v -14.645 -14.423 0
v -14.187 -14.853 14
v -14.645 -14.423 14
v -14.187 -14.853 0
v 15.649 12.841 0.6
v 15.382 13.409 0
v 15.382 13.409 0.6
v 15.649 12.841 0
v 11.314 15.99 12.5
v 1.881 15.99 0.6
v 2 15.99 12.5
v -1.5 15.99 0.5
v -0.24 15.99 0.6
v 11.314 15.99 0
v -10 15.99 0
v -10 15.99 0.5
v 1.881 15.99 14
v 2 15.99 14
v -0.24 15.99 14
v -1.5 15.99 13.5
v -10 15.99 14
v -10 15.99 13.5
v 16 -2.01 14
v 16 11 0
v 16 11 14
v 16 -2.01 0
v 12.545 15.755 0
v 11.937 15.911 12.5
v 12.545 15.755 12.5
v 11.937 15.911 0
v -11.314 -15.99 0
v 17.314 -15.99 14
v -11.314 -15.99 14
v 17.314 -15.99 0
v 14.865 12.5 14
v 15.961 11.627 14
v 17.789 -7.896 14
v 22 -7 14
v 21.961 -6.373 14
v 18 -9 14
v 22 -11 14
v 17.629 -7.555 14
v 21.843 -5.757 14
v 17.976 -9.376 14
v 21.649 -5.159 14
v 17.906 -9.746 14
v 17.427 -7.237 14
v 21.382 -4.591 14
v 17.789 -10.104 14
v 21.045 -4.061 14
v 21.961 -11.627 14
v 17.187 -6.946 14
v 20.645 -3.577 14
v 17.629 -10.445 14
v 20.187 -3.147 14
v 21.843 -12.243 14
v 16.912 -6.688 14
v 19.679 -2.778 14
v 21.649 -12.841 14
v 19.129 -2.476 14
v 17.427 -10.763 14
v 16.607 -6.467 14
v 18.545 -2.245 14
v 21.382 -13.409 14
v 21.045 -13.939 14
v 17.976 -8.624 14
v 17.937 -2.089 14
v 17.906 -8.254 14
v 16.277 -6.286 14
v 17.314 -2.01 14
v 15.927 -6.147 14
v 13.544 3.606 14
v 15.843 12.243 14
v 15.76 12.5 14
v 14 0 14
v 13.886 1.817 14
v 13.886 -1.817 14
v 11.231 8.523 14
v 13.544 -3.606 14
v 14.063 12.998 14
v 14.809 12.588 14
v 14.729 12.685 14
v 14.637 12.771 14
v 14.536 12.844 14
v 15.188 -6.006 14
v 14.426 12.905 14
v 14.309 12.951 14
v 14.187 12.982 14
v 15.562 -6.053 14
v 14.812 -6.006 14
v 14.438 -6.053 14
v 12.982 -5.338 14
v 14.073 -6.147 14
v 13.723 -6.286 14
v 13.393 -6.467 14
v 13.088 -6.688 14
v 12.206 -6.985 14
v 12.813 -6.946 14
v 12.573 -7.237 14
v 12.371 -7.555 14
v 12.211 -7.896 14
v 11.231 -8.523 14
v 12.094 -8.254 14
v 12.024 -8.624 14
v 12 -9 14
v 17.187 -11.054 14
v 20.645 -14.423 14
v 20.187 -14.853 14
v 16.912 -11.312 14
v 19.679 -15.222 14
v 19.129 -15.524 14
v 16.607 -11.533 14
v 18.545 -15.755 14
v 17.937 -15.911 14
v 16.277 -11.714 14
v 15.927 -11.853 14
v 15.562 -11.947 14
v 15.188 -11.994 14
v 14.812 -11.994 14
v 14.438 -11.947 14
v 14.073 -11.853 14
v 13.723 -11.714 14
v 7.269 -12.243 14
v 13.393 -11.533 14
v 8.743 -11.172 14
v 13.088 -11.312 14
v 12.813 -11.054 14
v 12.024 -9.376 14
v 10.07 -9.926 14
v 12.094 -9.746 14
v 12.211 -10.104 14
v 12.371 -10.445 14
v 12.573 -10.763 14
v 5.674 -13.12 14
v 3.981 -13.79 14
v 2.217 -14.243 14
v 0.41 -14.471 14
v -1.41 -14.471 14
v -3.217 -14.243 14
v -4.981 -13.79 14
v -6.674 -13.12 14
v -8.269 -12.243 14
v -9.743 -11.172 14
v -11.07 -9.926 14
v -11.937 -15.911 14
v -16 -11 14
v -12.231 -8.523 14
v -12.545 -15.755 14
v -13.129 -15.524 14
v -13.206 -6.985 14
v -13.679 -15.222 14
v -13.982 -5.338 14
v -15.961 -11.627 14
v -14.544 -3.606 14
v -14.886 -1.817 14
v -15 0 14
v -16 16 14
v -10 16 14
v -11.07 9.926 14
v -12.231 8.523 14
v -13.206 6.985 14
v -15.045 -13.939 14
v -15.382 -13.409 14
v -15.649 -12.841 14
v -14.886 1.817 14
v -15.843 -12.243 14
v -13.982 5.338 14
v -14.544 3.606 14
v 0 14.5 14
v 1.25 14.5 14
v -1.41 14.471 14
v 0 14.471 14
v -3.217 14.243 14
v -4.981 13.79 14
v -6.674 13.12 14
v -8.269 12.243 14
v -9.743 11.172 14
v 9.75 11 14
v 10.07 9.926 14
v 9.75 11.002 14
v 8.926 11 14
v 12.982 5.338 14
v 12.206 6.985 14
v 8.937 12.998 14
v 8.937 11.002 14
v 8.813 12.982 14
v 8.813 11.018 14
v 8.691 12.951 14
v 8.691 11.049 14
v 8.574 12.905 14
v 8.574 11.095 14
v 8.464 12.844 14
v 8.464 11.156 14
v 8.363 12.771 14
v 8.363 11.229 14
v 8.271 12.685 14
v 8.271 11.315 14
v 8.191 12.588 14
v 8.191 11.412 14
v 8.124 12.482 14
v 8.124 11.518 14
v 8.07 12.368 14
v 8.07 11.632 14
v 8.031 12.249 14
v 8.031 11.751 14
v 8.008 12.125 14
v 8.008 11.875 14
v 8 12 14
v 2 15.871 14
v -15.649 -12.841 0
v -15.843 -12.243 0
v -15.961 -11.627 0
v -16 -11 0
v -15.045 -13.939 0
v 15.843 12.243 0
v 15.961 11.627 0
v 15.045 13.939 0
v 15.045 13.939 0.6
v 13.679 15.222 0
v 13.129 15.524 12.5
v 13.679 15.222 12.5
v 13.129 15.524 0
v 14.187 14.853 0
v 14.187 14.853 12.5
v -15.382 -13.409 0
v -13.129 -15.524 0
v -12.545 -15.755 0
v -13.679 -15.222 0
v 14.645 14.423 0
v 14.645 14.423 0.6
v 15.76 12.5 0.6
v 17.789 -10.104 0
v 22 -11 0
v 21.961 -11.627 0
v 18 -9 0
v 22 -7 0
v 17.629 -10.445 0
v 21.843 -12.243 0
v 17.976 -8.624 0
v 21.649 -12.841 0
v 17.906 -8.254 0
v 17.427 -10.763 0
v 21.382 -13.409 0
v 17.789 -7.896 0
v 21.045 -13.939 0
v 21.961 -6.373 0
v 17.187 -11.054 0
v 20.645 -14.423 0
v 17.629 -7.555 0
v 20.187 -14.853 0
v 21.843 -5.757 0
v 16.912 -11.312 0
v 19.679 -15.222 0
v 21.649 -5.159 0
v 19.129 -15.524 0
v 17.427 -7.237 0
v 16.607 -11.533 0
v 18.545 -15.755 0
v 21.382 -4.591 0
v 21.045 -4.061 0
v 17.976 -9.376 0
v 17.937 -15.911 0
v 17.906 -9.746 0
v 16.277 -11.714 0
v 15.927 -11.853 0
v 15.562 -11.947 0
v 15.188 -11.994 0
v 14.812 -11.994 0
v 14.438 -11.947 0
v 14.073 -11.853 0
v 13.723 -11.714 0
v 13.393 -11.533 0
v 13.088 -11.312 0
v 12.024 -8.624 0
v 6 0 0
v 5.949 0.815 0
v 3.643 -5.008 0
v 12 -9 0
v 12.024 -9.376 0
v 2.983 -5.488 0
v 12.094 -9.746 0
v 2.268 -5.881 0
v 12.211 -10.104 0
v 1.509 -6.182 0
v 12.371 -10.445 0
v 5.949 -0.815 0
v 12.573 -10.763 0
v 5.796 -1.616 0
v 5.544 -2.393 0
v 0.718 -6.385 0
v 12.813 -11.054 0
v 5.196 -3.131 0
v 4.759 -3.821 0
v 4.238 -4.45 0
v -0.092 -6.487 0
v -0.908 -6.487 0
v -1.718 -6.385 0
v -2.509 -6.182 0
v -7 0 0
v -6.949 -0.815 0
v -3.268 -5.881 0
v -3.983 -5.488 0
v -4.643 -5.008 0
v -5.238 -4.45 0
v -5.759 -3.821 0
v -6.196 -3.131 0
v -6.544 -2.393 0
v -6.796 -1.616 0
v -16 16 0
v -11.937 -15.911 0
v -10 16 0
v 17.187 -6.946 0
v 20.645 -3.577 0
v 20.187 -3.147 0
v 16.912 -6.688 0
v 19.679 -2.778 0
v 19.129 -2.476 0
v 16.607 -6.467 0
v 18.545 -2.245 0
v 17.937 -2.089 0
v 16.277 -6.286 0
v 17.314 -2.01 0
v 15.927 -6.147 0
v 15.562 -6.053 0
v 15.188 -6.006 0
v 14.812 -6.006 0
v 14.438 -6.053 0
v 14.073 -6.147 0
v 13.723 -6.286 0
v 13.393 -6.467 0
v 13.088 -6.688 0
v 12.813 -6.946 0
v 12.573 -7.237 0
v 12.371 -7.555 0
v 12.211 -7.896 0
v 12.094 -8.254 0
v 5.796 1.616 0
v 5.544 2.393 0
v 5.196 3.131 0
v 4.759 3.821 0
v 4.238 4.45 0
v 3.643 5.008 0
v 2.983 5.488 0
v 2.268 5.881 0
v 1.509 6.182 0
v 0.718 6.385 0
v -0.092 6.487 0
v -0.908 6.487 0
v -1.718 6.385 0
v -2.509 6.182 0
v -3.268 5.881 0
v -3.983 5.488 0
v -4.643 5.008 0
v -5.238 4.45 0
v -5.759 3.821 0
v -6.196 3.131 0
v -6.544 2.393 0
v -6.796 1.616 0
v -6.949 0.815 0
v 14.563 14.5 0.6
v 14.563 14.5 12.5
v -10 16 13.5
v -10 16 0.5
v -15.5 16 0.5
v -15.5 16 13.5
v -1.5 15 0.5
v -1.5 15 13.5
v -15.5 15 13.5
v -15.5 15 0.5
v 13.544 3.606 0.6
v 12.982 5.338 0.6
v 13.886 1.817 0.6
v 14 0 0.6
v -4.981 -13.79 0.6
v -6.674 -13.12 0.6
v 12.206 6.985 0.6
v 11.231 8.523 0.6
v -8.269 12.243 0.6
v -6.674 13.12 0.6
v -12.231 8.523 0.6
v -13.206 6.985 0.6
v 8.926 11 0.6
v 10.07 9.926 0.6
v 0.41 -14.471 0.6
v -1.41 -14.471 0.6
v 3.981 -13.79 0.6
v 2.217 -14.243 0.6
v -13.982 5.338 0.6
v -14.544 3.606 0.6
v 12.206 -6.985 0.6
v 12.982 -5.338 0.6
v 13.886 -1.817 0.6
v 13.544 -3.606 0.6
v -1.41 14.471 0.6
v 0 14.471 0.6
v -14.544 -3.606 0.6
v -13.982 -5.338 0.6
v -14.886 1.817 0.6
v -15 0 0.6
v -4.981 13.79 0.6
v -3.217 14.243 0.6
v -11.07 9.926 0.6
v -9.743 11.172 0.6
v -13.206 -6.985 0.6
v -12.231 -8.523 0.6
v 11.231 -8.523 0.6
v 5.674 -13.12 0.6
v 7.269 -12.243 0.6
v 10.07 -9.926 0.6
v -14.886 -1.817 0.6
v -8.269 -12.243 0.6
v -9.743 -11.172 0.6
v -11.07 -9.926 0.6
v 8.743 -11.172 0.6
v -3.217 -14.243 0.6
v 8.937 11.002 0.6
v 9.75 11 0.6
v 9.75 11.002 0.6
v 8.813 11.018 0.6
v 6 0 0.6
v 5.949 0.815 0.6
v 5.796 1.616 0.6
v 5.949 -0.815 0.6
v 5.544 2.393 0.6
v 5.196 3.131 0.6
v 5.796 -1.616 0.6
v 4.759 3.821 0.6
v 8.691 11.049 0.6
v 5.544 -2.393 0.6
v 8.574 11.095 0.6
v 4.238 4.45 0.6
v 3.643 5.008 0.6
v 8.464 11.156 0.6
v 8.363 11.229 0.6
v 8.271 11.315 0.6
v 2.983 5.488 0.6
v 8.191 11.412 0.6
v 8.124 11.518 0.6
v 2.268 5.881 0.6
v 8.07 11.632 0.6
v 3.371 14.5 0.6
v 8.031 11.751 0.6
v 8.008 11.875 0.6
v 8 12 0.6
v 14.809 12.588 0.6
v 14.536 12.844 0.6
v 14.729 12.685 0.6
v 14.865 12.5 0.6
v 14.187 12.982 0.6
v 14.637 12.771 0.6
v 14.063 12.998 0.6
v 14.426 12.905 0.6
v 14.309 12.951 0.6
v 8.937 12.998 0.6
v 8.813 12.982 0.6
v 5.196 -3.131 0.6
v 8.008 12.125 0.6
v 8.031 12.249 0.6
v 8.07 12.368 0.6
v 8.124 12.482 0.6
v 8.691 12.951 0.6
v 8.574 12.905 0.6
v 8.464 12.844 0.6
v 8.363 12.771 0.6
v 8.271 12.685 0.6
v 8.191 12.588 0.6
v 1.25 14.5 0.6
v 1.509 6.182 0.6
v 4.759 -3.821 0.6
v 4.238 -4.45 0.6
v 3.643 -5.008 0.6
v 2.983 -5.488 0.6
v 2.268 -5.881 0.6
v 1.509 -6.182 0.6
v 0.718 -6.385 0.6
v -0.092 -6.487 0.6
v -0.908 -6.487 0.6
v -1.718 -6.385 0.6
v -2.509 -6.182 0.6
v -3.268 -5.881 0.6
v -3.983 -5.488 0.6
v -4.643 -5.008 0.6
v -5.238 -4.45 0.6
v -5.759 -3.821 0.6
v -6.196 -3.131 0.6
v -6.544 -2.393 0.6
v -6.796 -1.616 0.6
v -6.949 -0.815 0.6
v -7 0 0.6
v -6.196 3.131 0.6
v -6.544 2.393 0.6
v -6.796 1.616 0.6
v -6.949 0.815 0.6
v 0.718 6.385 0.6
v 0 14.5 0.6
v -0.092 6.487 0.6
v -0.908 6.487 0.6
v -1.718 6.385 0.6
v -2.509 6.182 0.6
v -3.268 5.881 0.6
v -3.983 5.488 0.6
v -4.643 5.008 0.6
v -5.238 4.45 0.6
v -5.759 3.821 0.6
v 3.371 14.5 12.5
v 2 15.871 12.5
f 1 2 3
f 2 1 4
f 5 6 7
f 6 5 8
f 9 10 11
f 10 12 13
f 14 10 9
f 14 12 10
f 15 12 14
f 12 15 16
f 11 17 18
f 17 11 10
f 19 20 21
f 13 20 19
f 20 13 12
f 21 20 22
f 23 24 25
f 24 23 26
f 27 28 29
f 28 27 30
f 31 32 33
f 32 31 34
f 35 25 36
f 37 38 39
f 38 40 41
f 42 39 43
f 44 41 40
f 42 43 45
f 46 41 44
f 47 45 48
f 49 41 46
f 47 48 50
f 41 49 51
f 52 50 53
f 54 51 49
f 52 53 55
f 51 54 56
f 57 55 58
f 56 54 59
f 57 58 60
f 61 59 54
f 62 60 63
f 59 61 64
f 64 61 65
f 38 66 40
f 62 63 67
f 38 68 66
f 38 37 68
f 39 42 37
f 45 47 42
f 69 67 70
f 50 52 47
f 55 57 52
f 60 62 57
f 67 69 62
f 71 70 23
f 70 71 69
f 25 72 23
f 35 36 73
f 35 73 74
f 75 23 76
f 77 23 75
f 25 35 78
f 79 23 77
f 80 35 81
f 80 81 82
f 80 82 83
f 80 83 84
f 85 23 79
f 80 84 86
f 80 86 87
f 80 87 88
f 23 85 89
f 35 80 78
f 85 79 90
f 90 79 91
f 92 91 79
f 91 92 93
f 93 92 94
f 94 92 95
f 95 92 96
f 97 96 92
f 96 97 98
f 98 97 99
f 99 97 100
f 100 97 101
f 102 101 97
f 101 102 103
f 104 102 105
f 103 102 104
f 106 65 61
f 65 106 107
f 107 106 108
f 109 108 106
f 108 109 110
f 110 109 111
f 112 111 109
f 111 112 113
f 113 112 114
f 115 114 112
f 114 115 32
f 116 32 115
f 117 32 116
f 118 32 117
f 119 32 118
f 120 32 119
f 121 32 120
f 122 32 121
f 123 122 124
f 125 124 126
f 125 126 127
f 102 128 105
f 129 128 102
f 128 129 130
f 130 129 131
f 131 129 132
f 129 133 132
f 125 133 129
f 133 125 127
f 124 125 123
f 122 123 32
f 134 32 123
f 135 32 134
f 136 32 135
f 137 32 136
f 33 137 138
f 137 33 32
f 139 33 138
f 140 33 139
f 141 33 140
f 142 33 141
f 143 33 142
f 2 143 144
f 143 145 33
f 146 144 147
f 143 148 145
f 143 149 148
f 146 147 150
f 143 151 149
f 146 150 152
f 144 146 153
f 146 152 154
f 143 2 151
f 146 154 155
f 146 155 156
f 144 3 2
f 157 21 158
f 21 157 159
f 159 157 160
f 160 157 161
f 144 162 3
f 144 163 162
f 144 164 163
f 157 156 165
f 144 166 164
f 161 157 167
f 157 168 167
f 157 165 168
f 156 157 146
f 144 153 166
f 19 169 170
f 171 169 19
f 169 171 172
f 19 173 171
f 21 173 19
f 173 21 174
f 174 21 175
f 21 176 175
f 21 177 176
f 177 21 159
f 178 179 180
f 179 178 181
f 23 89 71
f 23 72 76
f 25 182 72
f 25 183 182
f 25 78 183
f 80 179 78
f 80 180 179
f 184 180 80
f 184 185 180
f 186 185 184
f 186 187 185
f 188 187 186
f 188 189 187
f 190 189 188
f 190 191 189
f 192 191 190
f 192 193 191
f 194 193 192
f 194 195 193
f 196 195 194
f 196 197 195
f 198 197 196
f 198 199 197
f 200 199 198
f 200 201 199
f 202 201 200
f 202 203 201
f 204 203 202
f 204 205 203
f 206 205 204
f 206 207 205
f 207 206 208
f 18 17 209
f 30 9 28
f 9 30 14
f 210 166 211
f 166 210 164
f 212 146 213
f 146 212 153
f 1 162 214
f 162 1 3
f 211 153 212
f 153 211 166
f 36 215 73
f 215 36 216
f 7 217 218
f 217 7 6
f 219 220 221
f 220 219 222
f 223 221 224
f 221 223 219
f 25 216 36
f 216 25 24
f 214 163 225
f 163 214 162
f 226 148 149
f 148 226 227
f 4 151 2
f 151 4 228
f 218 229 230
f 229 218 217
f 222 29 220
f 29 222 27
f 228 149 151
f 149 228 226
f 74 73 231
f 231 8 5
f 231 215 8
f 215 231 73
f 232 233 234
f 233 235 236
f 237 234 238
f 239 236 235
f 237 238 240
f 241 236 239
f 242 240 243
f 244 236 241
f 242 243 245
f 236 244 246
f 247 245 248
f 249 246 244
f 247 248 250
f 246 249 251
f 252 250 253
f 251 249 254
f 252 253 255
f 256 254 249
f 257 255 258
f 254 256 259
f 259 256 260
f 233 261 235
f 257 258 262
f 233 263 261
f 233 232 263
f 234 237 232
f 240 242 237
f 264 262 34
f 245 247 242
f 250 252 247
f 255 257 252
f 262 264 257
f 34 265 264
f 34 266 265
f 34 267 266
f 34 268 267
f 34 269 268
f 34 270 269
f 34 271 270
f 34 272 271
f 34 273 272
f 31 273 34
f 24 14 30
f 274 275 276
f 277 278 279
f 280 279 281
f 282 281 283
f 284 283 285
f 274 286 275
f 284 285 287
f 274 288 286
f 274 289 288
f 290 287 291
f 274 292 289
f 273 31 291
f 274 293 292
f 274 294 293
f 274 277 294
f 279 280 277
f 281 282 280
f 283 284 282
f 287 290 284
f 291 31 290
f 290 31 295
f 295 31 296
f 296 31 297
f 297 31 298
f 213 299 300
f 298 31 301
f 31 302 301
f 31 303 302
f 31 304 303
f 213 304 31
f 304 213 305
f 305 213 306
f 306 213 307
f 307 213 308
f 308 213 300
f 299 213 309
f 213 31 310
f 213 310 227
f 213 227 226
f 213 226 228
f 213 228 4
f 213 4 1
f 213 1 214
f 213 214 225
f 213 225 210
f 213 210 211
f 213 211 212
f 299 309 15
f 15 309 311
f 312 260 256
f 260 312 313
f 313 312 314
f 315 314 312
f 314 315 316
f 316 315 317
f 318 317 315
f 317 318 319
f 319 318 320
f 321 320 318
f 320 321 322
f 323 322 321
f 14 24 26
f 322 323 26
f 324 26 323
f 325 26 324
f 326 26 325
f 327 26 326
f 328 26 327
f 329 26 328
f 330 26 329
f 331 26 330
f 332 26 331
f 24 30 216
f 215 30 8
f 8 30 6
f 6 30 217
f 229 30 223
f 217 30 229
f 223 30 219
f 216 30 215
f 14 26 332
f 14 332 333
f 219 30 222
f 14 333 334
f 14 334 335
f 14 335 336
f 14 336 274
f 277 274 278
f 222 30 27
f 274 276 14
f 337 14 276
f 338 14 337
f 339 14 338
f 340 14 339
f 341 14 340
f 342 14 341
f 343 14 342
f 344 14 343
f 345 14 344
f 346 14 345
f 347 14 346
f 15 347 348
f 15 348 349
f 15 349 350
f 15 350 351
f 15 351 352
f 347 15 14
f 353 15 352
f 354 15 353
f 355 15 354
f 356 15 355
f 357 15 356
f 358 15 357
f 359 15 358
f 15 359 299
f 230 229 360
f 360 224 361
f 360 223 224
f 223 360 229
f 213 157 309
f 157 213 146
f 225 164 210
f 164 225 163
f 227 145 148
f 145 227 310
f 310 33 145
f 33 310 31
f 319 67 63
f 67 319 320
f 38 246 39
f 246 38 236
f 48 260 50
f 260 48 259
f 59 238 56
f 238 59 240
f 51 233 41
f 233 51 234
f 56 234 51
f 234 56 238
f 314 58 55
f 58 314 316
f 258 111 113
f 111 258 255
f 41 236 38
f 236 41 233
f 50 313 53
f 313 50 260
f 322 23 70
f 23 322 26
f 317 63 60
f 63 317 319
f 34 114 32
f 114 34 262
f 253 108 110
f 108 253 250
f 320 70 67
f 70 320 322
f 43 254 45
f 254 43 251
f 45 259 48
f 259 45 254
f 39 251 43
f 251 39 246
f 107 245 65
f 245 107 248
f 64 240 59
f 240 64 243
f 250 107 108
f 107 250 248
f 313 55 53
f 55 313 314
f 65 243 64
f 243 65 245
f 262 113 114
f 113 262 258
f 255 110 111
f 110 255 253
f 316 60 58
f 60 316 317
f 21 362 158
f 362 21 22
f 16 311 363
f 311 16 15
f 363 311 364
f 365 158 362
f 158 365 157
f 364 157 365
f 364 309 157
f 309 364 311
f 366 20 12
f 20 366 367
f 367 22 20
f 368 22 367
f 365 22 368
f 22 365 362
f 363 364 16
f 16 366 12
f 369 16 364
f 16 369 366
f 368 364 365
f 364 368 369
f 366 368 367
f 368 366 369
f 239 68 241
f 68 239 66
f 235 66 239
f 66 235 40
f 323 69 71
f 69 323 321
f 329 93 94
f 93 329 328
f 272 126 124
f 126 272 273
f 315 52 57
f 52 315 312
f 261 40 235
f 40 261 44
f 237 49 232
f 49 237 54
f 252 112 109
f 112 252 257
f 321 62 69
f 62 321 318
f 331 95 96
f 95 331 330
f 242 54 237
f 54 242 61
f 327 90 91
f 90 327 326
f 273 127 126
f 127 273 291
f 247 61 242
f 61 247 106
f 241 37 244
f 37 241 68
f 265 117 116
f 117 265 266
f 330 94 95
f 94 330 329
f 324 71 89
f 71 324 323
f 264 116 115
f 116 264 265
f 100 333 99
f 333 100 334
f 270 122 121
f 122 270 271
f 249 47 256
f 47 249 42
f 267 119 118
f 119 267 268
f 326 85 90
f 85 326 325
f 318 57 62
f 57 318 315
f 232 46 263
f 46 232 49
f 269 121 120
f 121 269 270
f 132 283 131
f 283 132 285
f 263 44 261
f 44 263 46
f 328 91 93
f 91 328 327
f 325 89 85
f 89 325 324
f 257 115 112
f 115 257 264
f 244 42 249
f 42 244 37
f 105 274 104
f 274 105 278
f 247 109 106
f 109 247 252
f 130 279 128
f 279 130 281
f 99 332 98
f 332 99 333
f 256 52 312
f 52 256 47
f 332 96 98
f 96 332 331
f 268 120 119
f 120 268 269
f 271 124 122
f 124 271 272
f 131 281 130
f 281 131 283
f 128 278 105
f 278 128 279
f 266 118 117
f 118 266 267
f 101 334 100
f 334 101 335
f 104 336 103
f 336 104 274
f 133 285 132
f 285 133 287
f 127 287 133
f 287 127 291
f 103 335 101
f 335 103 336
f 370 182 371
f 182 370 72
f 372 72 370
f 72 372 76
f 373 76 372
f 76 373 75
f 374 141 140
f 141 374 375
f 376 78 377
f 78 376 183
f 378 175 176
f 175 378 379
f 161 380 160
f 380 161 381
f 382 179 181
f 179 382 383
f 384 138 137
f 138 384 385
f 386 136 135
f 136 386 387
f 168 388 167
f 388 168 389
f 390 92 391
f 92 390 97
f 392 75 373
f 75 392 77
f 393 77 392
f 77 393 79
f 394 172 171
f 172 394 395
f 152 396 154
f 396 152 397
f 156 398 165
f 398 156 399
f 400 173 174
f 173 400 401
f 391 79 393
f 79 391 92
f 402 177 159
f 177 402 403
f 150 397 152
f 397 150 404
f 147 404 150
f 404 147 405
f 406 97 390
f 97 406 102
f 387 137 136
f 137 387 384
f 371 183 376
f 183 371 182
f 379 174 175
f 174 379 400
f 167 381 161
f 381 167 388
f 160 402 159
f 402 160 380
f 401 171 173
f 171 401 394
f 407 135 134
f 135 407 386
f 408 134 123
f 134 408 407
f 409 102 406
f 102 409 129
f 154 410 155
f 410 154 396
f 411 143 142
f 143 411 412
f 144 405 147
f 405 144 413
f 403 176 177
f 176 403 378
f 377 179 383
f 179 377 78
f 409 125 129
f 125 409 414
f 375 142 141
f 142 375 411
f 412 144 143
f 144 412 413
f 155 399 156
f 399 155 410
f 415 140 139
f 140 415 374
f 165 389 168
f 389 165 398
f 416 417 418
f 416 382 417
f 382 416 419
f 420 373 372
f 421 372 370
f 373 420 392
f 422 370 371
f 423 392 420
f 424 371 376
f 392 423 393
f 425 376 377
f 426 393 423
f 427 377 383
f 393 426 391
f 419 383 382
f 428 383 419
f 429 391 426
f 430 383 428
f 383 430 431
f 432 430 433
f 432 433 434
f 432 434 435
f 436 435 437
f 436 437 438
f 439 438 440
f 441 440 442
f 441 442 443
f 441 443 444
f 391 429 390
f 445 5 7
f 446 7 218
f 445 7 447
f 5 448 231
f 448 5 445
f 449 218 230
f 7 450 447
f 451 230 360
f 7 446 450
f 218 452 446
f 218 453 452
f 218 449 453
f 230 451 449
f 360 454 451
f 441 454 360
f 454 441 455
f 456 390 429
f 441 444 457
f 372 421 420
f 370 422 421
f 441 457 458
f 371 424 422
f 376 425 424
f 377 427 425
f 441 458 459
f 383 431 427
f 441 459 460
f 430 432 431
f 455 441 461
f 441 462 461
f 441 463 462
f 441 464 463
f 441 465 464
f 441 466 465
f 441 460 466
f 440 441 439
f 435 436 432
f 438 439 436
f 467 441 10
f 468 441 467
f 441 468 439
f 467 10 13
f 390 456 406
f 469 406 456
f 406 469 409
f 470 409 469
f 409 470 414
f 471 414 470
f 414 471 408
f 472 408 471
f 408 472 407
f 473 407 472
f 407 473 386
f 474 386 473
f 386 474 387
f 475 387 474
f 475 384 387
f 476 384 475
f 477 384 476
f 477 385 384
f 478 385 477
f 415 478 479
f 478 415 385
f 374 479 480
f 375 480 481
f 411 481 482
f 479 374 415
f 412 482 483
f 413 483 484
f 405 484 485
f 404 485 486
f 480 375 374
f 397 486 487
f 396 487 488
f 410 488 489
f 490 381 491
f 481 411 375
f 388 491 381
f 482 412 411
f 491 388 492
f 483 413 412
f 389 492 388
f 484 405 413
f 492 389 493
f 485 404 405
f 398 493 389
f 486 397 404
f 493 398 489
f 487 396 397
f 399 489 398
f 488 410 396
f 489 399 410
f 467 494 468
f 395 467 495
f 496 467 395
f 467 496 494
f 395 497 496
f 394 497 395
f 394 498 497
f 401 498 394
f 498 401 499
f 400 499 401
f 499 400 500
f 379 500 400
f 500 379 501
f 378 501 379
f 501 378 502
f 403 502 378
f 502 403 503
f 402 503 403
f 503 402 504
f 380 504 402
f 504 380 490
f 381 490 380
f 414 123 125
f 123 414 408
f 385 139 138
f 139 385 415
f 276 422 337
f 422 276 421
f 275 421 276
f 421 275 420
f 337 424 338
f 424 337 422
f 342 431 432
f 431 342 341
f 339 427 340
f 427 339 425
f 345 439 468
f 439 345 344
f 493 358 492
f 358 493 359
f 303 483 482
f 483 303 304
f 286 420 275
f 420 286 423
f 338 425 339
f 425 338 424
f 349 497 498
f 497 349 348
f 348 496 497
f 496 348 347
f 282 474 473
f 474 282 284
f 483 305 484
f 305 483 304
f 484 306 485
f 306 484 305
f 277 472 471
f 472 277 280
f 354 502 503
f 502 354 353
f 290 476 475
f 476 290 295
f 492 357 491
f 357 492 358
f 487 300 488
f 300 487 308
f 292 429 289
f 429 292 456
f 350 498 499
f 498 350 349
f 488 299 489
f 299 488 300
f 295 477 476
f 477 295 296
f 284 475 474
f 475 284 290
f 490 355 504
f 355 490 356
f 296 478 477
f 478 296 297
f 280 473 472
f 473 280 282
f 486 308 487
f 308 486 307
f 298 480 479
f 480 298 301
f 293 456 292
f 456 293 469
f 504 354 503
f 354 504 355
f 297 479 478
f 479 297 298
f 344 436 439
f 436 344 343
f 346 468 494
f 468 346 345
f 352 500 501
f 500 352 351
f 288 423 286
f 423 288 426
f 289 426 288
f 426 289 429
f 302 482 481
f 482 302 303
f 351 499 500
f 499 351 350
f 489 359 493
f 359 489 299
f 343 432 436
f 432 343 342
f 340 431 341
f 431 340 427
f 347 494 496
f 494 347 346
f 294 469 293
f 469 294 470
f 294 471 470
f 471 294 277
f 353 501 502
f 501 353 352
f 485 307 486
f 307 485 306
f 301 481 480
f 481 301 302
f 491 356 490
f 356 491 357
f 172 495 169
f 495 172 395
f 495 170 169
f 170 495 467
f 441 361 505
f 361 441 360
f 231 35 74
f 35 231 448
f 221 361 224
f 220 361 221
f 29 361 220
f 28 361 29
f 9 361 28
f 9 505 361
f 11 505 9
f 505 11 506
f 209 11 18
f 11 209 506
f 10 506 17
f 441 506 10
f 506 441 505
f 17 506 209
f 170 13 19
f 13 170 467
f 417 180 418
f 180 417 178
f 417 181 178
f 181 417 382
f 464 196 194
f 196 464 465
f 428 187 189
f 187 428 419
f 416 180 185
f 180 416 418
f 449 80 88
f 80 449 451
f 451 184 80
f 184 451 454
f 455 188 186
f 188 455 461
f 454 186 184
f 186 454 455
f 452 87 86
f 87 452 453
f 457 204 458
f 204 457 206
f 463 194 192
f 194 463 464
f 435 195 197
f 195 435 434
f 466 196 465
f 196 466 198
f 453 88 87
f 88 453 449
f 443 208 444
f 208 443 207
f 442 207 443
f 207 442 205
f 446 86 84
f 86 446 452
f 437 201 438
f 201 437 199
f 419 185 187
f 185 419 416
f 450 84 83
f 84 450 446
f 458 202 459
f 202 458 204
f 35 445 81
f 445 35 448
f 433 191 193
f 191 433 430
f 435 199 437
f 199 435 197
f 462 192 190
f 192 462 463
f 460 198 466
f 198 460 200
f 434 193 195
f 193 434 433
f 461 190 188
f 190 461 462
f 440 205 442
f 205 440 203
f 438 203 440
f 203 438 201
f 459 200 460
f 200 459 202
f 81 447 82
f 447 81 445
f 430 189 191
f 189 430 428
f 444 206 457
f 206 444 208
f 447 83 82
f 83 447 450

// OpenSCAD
$fn = 50;


union() {
	difference() {
		union() {
			translate(v = [0, 0, 0]) {
				rotate(a = [0, 0, 0]) {
					hull() {
						translate(v = [-11.0000000000, 11.0000000000, 0]) {
							rotate(a = [0, 0, 0]) {
								translate(v = [0, 0, 0]) {
									rotate(a = [0, 0, 0]) {
										cylinder(h = 14, r = 5);
									}
								}
							}
						}
						translate(v = [11.0000000000, 11.0000000000, 0]) {
							rotate(a = [0, 0, 0]) {
								translate(v = [0, 0, 0]) {
									rotate(a = [0, 0, 0]) {
										cylinder(h = 14, r = 5);
									}
								}
							}
						}
						translate(v = [-11.0000000000, -11.0000000000, 0]) {
							rotate(a = [0, 0, 0]) {
								translate(v = [0, 0, 0]) {
									rotate(a = [0, 0, 0]) {
										cylinder(h = 14, r = 5);
									}
								}
							}
						}
						translate(v = [11.0000000000, -11.0000000000, 0]) {
							rotate(a = [0, 0, 0]) {
								translate(v = [0, 0, 0]) {
									rotate(a = [0, 0, 0]) {
										cylinder(h = 14, r = 5);
									}
								}
							}
						}
					}
				}
			}
			translate(v = [7.5000000000, -9.0000000000, 0]) {
				rotate(a = [0, 0, 0]) {
					hull() {
						translate(v = [-9.5000000000, 2.0000000000, 0]) {
							rotate(a = [0, 0, 0]) {
								translate(v = [0, 0, 0]) {
									rotate(a = [0, 0, 0]) {
										cylinder(h = 14, r = 5);
									}
								}
							}
						}
						translate(v = [9.5000000000, 2.0000000000, 0]) {
							rotate(a = [0, 0, 0]) {
								translate(v = [0, 0, 0]) {
									rotate(a = [0, 0, 0]) {
										cylinder(h = 14, r = 5);
									}
								}
							}
						}
						translate(v = [-9.5000000000, -2.0000000000, 0]) {
							rotate(a = [0, 0, 0]) {
								translate(v = [0, 0, 0]) {
									rotate(a = [0, 0, 0]) {
										cylinder(h = 14, r = 5);
									}
								}
							}
						}
						translate(v = [9.5000000000, -2.0000000000, 0]) {
							rotate(a = [0, 0, 0]) {
								translate(v = [0, 0, 0]) {
									rotate(a = [0, 0, 0]) {
										cylinder(h = 14, r = 5);
									}
								}
							}
						}
					}
				}
			}
			translate(v = [-16.0000000000, 10.0000000000, 0]) {
				rotate(a = [0, 0, 0]) {
					cube(size = [6, 6, 14]);
				}
			}
		}
		union() {
			translate(v = [-15.5000000000, 15.0000000000, 0.5000000000]) {
				rotate(a = [0, 0, 0]) {
					cube(size = [14, 1, 13.0000000000]);
				}
			}
			translate(v = [15.0000000000, -9.0000000000, -125.0000000000]) {
				rotate(a = [0, 0, 0]) {
					cylinder(h = 250, r = 3.0000000000);
				}
			}
			translate(v = [-0.5000000000, 0.0000000000, 0.6000000000]) {
				rotate(a = [0, 0, 0]) {
					cylinder(h = 16.4000000000, r = 14.5000000000);
				}
			}
			translate(v = [-0.5000000000, 0.0000000000, -7.0000000000]) {
				rotate(a = [0, 0, 0]) {
					cylinder(h = 14, r = 6.5000000000);
				}
			}
			translate(v = [0.0000000000, 12.5000000000, 0.6000000000]) {
				rotate(a = [0, 0, 0]) {
					cube(size = [16.0000000000, 2, 16.4000000000]);
				}
			}
			translate(v = [2.0000000000, 12.5000000000, 12.5000000000]) {
				rotate(a = [0, 0, 0]) {
					cube(size = [14.0000000000, 5, 1.5000000000]);
				}
			}
			translate(v = [-3.0000000000, 18.7500000000, 0.6000000000]) {
				rotate(a = [0, 0, -45]) {
					cube(size = [10, 1.5000000000, 16.4000000000]);
				}
			}
			translate(v = [2.2500000000, 11.0000000000, 0.6000000000]) {
				rotate(a = [0, 0, 0]) {
					cube(size = [7.5000000000, 2, 13.4000000000]);
				}
			}
		}
	}
	union() {
		translate(v = [11.5000000000, 12, 0]) {
			rotate(a = [0, 0, 0]) {
				hull() {
					translate(v = [2.5000000000, 0, 0]) {
						rotate(a = [0, 0, 0]) {
							translate(v = [0, 0, 0]) {
								rotate(a = [0, 0, 0]) {
									cylinder(h = 14, r = 1.0000000000);
								}
							}
						}
					}
					translate(v = [-2.5000000000, 0, 0]) {
						rotate(a = [0, 0, 0]) {
							translate(v = [0, 0, 0]) {
								rotate(a = [0, 0, 0]) {
									cylinder(h = 14, r = 1.0000000000);
								}
							}
						}
					}
				}
			}
		}
	}
}
